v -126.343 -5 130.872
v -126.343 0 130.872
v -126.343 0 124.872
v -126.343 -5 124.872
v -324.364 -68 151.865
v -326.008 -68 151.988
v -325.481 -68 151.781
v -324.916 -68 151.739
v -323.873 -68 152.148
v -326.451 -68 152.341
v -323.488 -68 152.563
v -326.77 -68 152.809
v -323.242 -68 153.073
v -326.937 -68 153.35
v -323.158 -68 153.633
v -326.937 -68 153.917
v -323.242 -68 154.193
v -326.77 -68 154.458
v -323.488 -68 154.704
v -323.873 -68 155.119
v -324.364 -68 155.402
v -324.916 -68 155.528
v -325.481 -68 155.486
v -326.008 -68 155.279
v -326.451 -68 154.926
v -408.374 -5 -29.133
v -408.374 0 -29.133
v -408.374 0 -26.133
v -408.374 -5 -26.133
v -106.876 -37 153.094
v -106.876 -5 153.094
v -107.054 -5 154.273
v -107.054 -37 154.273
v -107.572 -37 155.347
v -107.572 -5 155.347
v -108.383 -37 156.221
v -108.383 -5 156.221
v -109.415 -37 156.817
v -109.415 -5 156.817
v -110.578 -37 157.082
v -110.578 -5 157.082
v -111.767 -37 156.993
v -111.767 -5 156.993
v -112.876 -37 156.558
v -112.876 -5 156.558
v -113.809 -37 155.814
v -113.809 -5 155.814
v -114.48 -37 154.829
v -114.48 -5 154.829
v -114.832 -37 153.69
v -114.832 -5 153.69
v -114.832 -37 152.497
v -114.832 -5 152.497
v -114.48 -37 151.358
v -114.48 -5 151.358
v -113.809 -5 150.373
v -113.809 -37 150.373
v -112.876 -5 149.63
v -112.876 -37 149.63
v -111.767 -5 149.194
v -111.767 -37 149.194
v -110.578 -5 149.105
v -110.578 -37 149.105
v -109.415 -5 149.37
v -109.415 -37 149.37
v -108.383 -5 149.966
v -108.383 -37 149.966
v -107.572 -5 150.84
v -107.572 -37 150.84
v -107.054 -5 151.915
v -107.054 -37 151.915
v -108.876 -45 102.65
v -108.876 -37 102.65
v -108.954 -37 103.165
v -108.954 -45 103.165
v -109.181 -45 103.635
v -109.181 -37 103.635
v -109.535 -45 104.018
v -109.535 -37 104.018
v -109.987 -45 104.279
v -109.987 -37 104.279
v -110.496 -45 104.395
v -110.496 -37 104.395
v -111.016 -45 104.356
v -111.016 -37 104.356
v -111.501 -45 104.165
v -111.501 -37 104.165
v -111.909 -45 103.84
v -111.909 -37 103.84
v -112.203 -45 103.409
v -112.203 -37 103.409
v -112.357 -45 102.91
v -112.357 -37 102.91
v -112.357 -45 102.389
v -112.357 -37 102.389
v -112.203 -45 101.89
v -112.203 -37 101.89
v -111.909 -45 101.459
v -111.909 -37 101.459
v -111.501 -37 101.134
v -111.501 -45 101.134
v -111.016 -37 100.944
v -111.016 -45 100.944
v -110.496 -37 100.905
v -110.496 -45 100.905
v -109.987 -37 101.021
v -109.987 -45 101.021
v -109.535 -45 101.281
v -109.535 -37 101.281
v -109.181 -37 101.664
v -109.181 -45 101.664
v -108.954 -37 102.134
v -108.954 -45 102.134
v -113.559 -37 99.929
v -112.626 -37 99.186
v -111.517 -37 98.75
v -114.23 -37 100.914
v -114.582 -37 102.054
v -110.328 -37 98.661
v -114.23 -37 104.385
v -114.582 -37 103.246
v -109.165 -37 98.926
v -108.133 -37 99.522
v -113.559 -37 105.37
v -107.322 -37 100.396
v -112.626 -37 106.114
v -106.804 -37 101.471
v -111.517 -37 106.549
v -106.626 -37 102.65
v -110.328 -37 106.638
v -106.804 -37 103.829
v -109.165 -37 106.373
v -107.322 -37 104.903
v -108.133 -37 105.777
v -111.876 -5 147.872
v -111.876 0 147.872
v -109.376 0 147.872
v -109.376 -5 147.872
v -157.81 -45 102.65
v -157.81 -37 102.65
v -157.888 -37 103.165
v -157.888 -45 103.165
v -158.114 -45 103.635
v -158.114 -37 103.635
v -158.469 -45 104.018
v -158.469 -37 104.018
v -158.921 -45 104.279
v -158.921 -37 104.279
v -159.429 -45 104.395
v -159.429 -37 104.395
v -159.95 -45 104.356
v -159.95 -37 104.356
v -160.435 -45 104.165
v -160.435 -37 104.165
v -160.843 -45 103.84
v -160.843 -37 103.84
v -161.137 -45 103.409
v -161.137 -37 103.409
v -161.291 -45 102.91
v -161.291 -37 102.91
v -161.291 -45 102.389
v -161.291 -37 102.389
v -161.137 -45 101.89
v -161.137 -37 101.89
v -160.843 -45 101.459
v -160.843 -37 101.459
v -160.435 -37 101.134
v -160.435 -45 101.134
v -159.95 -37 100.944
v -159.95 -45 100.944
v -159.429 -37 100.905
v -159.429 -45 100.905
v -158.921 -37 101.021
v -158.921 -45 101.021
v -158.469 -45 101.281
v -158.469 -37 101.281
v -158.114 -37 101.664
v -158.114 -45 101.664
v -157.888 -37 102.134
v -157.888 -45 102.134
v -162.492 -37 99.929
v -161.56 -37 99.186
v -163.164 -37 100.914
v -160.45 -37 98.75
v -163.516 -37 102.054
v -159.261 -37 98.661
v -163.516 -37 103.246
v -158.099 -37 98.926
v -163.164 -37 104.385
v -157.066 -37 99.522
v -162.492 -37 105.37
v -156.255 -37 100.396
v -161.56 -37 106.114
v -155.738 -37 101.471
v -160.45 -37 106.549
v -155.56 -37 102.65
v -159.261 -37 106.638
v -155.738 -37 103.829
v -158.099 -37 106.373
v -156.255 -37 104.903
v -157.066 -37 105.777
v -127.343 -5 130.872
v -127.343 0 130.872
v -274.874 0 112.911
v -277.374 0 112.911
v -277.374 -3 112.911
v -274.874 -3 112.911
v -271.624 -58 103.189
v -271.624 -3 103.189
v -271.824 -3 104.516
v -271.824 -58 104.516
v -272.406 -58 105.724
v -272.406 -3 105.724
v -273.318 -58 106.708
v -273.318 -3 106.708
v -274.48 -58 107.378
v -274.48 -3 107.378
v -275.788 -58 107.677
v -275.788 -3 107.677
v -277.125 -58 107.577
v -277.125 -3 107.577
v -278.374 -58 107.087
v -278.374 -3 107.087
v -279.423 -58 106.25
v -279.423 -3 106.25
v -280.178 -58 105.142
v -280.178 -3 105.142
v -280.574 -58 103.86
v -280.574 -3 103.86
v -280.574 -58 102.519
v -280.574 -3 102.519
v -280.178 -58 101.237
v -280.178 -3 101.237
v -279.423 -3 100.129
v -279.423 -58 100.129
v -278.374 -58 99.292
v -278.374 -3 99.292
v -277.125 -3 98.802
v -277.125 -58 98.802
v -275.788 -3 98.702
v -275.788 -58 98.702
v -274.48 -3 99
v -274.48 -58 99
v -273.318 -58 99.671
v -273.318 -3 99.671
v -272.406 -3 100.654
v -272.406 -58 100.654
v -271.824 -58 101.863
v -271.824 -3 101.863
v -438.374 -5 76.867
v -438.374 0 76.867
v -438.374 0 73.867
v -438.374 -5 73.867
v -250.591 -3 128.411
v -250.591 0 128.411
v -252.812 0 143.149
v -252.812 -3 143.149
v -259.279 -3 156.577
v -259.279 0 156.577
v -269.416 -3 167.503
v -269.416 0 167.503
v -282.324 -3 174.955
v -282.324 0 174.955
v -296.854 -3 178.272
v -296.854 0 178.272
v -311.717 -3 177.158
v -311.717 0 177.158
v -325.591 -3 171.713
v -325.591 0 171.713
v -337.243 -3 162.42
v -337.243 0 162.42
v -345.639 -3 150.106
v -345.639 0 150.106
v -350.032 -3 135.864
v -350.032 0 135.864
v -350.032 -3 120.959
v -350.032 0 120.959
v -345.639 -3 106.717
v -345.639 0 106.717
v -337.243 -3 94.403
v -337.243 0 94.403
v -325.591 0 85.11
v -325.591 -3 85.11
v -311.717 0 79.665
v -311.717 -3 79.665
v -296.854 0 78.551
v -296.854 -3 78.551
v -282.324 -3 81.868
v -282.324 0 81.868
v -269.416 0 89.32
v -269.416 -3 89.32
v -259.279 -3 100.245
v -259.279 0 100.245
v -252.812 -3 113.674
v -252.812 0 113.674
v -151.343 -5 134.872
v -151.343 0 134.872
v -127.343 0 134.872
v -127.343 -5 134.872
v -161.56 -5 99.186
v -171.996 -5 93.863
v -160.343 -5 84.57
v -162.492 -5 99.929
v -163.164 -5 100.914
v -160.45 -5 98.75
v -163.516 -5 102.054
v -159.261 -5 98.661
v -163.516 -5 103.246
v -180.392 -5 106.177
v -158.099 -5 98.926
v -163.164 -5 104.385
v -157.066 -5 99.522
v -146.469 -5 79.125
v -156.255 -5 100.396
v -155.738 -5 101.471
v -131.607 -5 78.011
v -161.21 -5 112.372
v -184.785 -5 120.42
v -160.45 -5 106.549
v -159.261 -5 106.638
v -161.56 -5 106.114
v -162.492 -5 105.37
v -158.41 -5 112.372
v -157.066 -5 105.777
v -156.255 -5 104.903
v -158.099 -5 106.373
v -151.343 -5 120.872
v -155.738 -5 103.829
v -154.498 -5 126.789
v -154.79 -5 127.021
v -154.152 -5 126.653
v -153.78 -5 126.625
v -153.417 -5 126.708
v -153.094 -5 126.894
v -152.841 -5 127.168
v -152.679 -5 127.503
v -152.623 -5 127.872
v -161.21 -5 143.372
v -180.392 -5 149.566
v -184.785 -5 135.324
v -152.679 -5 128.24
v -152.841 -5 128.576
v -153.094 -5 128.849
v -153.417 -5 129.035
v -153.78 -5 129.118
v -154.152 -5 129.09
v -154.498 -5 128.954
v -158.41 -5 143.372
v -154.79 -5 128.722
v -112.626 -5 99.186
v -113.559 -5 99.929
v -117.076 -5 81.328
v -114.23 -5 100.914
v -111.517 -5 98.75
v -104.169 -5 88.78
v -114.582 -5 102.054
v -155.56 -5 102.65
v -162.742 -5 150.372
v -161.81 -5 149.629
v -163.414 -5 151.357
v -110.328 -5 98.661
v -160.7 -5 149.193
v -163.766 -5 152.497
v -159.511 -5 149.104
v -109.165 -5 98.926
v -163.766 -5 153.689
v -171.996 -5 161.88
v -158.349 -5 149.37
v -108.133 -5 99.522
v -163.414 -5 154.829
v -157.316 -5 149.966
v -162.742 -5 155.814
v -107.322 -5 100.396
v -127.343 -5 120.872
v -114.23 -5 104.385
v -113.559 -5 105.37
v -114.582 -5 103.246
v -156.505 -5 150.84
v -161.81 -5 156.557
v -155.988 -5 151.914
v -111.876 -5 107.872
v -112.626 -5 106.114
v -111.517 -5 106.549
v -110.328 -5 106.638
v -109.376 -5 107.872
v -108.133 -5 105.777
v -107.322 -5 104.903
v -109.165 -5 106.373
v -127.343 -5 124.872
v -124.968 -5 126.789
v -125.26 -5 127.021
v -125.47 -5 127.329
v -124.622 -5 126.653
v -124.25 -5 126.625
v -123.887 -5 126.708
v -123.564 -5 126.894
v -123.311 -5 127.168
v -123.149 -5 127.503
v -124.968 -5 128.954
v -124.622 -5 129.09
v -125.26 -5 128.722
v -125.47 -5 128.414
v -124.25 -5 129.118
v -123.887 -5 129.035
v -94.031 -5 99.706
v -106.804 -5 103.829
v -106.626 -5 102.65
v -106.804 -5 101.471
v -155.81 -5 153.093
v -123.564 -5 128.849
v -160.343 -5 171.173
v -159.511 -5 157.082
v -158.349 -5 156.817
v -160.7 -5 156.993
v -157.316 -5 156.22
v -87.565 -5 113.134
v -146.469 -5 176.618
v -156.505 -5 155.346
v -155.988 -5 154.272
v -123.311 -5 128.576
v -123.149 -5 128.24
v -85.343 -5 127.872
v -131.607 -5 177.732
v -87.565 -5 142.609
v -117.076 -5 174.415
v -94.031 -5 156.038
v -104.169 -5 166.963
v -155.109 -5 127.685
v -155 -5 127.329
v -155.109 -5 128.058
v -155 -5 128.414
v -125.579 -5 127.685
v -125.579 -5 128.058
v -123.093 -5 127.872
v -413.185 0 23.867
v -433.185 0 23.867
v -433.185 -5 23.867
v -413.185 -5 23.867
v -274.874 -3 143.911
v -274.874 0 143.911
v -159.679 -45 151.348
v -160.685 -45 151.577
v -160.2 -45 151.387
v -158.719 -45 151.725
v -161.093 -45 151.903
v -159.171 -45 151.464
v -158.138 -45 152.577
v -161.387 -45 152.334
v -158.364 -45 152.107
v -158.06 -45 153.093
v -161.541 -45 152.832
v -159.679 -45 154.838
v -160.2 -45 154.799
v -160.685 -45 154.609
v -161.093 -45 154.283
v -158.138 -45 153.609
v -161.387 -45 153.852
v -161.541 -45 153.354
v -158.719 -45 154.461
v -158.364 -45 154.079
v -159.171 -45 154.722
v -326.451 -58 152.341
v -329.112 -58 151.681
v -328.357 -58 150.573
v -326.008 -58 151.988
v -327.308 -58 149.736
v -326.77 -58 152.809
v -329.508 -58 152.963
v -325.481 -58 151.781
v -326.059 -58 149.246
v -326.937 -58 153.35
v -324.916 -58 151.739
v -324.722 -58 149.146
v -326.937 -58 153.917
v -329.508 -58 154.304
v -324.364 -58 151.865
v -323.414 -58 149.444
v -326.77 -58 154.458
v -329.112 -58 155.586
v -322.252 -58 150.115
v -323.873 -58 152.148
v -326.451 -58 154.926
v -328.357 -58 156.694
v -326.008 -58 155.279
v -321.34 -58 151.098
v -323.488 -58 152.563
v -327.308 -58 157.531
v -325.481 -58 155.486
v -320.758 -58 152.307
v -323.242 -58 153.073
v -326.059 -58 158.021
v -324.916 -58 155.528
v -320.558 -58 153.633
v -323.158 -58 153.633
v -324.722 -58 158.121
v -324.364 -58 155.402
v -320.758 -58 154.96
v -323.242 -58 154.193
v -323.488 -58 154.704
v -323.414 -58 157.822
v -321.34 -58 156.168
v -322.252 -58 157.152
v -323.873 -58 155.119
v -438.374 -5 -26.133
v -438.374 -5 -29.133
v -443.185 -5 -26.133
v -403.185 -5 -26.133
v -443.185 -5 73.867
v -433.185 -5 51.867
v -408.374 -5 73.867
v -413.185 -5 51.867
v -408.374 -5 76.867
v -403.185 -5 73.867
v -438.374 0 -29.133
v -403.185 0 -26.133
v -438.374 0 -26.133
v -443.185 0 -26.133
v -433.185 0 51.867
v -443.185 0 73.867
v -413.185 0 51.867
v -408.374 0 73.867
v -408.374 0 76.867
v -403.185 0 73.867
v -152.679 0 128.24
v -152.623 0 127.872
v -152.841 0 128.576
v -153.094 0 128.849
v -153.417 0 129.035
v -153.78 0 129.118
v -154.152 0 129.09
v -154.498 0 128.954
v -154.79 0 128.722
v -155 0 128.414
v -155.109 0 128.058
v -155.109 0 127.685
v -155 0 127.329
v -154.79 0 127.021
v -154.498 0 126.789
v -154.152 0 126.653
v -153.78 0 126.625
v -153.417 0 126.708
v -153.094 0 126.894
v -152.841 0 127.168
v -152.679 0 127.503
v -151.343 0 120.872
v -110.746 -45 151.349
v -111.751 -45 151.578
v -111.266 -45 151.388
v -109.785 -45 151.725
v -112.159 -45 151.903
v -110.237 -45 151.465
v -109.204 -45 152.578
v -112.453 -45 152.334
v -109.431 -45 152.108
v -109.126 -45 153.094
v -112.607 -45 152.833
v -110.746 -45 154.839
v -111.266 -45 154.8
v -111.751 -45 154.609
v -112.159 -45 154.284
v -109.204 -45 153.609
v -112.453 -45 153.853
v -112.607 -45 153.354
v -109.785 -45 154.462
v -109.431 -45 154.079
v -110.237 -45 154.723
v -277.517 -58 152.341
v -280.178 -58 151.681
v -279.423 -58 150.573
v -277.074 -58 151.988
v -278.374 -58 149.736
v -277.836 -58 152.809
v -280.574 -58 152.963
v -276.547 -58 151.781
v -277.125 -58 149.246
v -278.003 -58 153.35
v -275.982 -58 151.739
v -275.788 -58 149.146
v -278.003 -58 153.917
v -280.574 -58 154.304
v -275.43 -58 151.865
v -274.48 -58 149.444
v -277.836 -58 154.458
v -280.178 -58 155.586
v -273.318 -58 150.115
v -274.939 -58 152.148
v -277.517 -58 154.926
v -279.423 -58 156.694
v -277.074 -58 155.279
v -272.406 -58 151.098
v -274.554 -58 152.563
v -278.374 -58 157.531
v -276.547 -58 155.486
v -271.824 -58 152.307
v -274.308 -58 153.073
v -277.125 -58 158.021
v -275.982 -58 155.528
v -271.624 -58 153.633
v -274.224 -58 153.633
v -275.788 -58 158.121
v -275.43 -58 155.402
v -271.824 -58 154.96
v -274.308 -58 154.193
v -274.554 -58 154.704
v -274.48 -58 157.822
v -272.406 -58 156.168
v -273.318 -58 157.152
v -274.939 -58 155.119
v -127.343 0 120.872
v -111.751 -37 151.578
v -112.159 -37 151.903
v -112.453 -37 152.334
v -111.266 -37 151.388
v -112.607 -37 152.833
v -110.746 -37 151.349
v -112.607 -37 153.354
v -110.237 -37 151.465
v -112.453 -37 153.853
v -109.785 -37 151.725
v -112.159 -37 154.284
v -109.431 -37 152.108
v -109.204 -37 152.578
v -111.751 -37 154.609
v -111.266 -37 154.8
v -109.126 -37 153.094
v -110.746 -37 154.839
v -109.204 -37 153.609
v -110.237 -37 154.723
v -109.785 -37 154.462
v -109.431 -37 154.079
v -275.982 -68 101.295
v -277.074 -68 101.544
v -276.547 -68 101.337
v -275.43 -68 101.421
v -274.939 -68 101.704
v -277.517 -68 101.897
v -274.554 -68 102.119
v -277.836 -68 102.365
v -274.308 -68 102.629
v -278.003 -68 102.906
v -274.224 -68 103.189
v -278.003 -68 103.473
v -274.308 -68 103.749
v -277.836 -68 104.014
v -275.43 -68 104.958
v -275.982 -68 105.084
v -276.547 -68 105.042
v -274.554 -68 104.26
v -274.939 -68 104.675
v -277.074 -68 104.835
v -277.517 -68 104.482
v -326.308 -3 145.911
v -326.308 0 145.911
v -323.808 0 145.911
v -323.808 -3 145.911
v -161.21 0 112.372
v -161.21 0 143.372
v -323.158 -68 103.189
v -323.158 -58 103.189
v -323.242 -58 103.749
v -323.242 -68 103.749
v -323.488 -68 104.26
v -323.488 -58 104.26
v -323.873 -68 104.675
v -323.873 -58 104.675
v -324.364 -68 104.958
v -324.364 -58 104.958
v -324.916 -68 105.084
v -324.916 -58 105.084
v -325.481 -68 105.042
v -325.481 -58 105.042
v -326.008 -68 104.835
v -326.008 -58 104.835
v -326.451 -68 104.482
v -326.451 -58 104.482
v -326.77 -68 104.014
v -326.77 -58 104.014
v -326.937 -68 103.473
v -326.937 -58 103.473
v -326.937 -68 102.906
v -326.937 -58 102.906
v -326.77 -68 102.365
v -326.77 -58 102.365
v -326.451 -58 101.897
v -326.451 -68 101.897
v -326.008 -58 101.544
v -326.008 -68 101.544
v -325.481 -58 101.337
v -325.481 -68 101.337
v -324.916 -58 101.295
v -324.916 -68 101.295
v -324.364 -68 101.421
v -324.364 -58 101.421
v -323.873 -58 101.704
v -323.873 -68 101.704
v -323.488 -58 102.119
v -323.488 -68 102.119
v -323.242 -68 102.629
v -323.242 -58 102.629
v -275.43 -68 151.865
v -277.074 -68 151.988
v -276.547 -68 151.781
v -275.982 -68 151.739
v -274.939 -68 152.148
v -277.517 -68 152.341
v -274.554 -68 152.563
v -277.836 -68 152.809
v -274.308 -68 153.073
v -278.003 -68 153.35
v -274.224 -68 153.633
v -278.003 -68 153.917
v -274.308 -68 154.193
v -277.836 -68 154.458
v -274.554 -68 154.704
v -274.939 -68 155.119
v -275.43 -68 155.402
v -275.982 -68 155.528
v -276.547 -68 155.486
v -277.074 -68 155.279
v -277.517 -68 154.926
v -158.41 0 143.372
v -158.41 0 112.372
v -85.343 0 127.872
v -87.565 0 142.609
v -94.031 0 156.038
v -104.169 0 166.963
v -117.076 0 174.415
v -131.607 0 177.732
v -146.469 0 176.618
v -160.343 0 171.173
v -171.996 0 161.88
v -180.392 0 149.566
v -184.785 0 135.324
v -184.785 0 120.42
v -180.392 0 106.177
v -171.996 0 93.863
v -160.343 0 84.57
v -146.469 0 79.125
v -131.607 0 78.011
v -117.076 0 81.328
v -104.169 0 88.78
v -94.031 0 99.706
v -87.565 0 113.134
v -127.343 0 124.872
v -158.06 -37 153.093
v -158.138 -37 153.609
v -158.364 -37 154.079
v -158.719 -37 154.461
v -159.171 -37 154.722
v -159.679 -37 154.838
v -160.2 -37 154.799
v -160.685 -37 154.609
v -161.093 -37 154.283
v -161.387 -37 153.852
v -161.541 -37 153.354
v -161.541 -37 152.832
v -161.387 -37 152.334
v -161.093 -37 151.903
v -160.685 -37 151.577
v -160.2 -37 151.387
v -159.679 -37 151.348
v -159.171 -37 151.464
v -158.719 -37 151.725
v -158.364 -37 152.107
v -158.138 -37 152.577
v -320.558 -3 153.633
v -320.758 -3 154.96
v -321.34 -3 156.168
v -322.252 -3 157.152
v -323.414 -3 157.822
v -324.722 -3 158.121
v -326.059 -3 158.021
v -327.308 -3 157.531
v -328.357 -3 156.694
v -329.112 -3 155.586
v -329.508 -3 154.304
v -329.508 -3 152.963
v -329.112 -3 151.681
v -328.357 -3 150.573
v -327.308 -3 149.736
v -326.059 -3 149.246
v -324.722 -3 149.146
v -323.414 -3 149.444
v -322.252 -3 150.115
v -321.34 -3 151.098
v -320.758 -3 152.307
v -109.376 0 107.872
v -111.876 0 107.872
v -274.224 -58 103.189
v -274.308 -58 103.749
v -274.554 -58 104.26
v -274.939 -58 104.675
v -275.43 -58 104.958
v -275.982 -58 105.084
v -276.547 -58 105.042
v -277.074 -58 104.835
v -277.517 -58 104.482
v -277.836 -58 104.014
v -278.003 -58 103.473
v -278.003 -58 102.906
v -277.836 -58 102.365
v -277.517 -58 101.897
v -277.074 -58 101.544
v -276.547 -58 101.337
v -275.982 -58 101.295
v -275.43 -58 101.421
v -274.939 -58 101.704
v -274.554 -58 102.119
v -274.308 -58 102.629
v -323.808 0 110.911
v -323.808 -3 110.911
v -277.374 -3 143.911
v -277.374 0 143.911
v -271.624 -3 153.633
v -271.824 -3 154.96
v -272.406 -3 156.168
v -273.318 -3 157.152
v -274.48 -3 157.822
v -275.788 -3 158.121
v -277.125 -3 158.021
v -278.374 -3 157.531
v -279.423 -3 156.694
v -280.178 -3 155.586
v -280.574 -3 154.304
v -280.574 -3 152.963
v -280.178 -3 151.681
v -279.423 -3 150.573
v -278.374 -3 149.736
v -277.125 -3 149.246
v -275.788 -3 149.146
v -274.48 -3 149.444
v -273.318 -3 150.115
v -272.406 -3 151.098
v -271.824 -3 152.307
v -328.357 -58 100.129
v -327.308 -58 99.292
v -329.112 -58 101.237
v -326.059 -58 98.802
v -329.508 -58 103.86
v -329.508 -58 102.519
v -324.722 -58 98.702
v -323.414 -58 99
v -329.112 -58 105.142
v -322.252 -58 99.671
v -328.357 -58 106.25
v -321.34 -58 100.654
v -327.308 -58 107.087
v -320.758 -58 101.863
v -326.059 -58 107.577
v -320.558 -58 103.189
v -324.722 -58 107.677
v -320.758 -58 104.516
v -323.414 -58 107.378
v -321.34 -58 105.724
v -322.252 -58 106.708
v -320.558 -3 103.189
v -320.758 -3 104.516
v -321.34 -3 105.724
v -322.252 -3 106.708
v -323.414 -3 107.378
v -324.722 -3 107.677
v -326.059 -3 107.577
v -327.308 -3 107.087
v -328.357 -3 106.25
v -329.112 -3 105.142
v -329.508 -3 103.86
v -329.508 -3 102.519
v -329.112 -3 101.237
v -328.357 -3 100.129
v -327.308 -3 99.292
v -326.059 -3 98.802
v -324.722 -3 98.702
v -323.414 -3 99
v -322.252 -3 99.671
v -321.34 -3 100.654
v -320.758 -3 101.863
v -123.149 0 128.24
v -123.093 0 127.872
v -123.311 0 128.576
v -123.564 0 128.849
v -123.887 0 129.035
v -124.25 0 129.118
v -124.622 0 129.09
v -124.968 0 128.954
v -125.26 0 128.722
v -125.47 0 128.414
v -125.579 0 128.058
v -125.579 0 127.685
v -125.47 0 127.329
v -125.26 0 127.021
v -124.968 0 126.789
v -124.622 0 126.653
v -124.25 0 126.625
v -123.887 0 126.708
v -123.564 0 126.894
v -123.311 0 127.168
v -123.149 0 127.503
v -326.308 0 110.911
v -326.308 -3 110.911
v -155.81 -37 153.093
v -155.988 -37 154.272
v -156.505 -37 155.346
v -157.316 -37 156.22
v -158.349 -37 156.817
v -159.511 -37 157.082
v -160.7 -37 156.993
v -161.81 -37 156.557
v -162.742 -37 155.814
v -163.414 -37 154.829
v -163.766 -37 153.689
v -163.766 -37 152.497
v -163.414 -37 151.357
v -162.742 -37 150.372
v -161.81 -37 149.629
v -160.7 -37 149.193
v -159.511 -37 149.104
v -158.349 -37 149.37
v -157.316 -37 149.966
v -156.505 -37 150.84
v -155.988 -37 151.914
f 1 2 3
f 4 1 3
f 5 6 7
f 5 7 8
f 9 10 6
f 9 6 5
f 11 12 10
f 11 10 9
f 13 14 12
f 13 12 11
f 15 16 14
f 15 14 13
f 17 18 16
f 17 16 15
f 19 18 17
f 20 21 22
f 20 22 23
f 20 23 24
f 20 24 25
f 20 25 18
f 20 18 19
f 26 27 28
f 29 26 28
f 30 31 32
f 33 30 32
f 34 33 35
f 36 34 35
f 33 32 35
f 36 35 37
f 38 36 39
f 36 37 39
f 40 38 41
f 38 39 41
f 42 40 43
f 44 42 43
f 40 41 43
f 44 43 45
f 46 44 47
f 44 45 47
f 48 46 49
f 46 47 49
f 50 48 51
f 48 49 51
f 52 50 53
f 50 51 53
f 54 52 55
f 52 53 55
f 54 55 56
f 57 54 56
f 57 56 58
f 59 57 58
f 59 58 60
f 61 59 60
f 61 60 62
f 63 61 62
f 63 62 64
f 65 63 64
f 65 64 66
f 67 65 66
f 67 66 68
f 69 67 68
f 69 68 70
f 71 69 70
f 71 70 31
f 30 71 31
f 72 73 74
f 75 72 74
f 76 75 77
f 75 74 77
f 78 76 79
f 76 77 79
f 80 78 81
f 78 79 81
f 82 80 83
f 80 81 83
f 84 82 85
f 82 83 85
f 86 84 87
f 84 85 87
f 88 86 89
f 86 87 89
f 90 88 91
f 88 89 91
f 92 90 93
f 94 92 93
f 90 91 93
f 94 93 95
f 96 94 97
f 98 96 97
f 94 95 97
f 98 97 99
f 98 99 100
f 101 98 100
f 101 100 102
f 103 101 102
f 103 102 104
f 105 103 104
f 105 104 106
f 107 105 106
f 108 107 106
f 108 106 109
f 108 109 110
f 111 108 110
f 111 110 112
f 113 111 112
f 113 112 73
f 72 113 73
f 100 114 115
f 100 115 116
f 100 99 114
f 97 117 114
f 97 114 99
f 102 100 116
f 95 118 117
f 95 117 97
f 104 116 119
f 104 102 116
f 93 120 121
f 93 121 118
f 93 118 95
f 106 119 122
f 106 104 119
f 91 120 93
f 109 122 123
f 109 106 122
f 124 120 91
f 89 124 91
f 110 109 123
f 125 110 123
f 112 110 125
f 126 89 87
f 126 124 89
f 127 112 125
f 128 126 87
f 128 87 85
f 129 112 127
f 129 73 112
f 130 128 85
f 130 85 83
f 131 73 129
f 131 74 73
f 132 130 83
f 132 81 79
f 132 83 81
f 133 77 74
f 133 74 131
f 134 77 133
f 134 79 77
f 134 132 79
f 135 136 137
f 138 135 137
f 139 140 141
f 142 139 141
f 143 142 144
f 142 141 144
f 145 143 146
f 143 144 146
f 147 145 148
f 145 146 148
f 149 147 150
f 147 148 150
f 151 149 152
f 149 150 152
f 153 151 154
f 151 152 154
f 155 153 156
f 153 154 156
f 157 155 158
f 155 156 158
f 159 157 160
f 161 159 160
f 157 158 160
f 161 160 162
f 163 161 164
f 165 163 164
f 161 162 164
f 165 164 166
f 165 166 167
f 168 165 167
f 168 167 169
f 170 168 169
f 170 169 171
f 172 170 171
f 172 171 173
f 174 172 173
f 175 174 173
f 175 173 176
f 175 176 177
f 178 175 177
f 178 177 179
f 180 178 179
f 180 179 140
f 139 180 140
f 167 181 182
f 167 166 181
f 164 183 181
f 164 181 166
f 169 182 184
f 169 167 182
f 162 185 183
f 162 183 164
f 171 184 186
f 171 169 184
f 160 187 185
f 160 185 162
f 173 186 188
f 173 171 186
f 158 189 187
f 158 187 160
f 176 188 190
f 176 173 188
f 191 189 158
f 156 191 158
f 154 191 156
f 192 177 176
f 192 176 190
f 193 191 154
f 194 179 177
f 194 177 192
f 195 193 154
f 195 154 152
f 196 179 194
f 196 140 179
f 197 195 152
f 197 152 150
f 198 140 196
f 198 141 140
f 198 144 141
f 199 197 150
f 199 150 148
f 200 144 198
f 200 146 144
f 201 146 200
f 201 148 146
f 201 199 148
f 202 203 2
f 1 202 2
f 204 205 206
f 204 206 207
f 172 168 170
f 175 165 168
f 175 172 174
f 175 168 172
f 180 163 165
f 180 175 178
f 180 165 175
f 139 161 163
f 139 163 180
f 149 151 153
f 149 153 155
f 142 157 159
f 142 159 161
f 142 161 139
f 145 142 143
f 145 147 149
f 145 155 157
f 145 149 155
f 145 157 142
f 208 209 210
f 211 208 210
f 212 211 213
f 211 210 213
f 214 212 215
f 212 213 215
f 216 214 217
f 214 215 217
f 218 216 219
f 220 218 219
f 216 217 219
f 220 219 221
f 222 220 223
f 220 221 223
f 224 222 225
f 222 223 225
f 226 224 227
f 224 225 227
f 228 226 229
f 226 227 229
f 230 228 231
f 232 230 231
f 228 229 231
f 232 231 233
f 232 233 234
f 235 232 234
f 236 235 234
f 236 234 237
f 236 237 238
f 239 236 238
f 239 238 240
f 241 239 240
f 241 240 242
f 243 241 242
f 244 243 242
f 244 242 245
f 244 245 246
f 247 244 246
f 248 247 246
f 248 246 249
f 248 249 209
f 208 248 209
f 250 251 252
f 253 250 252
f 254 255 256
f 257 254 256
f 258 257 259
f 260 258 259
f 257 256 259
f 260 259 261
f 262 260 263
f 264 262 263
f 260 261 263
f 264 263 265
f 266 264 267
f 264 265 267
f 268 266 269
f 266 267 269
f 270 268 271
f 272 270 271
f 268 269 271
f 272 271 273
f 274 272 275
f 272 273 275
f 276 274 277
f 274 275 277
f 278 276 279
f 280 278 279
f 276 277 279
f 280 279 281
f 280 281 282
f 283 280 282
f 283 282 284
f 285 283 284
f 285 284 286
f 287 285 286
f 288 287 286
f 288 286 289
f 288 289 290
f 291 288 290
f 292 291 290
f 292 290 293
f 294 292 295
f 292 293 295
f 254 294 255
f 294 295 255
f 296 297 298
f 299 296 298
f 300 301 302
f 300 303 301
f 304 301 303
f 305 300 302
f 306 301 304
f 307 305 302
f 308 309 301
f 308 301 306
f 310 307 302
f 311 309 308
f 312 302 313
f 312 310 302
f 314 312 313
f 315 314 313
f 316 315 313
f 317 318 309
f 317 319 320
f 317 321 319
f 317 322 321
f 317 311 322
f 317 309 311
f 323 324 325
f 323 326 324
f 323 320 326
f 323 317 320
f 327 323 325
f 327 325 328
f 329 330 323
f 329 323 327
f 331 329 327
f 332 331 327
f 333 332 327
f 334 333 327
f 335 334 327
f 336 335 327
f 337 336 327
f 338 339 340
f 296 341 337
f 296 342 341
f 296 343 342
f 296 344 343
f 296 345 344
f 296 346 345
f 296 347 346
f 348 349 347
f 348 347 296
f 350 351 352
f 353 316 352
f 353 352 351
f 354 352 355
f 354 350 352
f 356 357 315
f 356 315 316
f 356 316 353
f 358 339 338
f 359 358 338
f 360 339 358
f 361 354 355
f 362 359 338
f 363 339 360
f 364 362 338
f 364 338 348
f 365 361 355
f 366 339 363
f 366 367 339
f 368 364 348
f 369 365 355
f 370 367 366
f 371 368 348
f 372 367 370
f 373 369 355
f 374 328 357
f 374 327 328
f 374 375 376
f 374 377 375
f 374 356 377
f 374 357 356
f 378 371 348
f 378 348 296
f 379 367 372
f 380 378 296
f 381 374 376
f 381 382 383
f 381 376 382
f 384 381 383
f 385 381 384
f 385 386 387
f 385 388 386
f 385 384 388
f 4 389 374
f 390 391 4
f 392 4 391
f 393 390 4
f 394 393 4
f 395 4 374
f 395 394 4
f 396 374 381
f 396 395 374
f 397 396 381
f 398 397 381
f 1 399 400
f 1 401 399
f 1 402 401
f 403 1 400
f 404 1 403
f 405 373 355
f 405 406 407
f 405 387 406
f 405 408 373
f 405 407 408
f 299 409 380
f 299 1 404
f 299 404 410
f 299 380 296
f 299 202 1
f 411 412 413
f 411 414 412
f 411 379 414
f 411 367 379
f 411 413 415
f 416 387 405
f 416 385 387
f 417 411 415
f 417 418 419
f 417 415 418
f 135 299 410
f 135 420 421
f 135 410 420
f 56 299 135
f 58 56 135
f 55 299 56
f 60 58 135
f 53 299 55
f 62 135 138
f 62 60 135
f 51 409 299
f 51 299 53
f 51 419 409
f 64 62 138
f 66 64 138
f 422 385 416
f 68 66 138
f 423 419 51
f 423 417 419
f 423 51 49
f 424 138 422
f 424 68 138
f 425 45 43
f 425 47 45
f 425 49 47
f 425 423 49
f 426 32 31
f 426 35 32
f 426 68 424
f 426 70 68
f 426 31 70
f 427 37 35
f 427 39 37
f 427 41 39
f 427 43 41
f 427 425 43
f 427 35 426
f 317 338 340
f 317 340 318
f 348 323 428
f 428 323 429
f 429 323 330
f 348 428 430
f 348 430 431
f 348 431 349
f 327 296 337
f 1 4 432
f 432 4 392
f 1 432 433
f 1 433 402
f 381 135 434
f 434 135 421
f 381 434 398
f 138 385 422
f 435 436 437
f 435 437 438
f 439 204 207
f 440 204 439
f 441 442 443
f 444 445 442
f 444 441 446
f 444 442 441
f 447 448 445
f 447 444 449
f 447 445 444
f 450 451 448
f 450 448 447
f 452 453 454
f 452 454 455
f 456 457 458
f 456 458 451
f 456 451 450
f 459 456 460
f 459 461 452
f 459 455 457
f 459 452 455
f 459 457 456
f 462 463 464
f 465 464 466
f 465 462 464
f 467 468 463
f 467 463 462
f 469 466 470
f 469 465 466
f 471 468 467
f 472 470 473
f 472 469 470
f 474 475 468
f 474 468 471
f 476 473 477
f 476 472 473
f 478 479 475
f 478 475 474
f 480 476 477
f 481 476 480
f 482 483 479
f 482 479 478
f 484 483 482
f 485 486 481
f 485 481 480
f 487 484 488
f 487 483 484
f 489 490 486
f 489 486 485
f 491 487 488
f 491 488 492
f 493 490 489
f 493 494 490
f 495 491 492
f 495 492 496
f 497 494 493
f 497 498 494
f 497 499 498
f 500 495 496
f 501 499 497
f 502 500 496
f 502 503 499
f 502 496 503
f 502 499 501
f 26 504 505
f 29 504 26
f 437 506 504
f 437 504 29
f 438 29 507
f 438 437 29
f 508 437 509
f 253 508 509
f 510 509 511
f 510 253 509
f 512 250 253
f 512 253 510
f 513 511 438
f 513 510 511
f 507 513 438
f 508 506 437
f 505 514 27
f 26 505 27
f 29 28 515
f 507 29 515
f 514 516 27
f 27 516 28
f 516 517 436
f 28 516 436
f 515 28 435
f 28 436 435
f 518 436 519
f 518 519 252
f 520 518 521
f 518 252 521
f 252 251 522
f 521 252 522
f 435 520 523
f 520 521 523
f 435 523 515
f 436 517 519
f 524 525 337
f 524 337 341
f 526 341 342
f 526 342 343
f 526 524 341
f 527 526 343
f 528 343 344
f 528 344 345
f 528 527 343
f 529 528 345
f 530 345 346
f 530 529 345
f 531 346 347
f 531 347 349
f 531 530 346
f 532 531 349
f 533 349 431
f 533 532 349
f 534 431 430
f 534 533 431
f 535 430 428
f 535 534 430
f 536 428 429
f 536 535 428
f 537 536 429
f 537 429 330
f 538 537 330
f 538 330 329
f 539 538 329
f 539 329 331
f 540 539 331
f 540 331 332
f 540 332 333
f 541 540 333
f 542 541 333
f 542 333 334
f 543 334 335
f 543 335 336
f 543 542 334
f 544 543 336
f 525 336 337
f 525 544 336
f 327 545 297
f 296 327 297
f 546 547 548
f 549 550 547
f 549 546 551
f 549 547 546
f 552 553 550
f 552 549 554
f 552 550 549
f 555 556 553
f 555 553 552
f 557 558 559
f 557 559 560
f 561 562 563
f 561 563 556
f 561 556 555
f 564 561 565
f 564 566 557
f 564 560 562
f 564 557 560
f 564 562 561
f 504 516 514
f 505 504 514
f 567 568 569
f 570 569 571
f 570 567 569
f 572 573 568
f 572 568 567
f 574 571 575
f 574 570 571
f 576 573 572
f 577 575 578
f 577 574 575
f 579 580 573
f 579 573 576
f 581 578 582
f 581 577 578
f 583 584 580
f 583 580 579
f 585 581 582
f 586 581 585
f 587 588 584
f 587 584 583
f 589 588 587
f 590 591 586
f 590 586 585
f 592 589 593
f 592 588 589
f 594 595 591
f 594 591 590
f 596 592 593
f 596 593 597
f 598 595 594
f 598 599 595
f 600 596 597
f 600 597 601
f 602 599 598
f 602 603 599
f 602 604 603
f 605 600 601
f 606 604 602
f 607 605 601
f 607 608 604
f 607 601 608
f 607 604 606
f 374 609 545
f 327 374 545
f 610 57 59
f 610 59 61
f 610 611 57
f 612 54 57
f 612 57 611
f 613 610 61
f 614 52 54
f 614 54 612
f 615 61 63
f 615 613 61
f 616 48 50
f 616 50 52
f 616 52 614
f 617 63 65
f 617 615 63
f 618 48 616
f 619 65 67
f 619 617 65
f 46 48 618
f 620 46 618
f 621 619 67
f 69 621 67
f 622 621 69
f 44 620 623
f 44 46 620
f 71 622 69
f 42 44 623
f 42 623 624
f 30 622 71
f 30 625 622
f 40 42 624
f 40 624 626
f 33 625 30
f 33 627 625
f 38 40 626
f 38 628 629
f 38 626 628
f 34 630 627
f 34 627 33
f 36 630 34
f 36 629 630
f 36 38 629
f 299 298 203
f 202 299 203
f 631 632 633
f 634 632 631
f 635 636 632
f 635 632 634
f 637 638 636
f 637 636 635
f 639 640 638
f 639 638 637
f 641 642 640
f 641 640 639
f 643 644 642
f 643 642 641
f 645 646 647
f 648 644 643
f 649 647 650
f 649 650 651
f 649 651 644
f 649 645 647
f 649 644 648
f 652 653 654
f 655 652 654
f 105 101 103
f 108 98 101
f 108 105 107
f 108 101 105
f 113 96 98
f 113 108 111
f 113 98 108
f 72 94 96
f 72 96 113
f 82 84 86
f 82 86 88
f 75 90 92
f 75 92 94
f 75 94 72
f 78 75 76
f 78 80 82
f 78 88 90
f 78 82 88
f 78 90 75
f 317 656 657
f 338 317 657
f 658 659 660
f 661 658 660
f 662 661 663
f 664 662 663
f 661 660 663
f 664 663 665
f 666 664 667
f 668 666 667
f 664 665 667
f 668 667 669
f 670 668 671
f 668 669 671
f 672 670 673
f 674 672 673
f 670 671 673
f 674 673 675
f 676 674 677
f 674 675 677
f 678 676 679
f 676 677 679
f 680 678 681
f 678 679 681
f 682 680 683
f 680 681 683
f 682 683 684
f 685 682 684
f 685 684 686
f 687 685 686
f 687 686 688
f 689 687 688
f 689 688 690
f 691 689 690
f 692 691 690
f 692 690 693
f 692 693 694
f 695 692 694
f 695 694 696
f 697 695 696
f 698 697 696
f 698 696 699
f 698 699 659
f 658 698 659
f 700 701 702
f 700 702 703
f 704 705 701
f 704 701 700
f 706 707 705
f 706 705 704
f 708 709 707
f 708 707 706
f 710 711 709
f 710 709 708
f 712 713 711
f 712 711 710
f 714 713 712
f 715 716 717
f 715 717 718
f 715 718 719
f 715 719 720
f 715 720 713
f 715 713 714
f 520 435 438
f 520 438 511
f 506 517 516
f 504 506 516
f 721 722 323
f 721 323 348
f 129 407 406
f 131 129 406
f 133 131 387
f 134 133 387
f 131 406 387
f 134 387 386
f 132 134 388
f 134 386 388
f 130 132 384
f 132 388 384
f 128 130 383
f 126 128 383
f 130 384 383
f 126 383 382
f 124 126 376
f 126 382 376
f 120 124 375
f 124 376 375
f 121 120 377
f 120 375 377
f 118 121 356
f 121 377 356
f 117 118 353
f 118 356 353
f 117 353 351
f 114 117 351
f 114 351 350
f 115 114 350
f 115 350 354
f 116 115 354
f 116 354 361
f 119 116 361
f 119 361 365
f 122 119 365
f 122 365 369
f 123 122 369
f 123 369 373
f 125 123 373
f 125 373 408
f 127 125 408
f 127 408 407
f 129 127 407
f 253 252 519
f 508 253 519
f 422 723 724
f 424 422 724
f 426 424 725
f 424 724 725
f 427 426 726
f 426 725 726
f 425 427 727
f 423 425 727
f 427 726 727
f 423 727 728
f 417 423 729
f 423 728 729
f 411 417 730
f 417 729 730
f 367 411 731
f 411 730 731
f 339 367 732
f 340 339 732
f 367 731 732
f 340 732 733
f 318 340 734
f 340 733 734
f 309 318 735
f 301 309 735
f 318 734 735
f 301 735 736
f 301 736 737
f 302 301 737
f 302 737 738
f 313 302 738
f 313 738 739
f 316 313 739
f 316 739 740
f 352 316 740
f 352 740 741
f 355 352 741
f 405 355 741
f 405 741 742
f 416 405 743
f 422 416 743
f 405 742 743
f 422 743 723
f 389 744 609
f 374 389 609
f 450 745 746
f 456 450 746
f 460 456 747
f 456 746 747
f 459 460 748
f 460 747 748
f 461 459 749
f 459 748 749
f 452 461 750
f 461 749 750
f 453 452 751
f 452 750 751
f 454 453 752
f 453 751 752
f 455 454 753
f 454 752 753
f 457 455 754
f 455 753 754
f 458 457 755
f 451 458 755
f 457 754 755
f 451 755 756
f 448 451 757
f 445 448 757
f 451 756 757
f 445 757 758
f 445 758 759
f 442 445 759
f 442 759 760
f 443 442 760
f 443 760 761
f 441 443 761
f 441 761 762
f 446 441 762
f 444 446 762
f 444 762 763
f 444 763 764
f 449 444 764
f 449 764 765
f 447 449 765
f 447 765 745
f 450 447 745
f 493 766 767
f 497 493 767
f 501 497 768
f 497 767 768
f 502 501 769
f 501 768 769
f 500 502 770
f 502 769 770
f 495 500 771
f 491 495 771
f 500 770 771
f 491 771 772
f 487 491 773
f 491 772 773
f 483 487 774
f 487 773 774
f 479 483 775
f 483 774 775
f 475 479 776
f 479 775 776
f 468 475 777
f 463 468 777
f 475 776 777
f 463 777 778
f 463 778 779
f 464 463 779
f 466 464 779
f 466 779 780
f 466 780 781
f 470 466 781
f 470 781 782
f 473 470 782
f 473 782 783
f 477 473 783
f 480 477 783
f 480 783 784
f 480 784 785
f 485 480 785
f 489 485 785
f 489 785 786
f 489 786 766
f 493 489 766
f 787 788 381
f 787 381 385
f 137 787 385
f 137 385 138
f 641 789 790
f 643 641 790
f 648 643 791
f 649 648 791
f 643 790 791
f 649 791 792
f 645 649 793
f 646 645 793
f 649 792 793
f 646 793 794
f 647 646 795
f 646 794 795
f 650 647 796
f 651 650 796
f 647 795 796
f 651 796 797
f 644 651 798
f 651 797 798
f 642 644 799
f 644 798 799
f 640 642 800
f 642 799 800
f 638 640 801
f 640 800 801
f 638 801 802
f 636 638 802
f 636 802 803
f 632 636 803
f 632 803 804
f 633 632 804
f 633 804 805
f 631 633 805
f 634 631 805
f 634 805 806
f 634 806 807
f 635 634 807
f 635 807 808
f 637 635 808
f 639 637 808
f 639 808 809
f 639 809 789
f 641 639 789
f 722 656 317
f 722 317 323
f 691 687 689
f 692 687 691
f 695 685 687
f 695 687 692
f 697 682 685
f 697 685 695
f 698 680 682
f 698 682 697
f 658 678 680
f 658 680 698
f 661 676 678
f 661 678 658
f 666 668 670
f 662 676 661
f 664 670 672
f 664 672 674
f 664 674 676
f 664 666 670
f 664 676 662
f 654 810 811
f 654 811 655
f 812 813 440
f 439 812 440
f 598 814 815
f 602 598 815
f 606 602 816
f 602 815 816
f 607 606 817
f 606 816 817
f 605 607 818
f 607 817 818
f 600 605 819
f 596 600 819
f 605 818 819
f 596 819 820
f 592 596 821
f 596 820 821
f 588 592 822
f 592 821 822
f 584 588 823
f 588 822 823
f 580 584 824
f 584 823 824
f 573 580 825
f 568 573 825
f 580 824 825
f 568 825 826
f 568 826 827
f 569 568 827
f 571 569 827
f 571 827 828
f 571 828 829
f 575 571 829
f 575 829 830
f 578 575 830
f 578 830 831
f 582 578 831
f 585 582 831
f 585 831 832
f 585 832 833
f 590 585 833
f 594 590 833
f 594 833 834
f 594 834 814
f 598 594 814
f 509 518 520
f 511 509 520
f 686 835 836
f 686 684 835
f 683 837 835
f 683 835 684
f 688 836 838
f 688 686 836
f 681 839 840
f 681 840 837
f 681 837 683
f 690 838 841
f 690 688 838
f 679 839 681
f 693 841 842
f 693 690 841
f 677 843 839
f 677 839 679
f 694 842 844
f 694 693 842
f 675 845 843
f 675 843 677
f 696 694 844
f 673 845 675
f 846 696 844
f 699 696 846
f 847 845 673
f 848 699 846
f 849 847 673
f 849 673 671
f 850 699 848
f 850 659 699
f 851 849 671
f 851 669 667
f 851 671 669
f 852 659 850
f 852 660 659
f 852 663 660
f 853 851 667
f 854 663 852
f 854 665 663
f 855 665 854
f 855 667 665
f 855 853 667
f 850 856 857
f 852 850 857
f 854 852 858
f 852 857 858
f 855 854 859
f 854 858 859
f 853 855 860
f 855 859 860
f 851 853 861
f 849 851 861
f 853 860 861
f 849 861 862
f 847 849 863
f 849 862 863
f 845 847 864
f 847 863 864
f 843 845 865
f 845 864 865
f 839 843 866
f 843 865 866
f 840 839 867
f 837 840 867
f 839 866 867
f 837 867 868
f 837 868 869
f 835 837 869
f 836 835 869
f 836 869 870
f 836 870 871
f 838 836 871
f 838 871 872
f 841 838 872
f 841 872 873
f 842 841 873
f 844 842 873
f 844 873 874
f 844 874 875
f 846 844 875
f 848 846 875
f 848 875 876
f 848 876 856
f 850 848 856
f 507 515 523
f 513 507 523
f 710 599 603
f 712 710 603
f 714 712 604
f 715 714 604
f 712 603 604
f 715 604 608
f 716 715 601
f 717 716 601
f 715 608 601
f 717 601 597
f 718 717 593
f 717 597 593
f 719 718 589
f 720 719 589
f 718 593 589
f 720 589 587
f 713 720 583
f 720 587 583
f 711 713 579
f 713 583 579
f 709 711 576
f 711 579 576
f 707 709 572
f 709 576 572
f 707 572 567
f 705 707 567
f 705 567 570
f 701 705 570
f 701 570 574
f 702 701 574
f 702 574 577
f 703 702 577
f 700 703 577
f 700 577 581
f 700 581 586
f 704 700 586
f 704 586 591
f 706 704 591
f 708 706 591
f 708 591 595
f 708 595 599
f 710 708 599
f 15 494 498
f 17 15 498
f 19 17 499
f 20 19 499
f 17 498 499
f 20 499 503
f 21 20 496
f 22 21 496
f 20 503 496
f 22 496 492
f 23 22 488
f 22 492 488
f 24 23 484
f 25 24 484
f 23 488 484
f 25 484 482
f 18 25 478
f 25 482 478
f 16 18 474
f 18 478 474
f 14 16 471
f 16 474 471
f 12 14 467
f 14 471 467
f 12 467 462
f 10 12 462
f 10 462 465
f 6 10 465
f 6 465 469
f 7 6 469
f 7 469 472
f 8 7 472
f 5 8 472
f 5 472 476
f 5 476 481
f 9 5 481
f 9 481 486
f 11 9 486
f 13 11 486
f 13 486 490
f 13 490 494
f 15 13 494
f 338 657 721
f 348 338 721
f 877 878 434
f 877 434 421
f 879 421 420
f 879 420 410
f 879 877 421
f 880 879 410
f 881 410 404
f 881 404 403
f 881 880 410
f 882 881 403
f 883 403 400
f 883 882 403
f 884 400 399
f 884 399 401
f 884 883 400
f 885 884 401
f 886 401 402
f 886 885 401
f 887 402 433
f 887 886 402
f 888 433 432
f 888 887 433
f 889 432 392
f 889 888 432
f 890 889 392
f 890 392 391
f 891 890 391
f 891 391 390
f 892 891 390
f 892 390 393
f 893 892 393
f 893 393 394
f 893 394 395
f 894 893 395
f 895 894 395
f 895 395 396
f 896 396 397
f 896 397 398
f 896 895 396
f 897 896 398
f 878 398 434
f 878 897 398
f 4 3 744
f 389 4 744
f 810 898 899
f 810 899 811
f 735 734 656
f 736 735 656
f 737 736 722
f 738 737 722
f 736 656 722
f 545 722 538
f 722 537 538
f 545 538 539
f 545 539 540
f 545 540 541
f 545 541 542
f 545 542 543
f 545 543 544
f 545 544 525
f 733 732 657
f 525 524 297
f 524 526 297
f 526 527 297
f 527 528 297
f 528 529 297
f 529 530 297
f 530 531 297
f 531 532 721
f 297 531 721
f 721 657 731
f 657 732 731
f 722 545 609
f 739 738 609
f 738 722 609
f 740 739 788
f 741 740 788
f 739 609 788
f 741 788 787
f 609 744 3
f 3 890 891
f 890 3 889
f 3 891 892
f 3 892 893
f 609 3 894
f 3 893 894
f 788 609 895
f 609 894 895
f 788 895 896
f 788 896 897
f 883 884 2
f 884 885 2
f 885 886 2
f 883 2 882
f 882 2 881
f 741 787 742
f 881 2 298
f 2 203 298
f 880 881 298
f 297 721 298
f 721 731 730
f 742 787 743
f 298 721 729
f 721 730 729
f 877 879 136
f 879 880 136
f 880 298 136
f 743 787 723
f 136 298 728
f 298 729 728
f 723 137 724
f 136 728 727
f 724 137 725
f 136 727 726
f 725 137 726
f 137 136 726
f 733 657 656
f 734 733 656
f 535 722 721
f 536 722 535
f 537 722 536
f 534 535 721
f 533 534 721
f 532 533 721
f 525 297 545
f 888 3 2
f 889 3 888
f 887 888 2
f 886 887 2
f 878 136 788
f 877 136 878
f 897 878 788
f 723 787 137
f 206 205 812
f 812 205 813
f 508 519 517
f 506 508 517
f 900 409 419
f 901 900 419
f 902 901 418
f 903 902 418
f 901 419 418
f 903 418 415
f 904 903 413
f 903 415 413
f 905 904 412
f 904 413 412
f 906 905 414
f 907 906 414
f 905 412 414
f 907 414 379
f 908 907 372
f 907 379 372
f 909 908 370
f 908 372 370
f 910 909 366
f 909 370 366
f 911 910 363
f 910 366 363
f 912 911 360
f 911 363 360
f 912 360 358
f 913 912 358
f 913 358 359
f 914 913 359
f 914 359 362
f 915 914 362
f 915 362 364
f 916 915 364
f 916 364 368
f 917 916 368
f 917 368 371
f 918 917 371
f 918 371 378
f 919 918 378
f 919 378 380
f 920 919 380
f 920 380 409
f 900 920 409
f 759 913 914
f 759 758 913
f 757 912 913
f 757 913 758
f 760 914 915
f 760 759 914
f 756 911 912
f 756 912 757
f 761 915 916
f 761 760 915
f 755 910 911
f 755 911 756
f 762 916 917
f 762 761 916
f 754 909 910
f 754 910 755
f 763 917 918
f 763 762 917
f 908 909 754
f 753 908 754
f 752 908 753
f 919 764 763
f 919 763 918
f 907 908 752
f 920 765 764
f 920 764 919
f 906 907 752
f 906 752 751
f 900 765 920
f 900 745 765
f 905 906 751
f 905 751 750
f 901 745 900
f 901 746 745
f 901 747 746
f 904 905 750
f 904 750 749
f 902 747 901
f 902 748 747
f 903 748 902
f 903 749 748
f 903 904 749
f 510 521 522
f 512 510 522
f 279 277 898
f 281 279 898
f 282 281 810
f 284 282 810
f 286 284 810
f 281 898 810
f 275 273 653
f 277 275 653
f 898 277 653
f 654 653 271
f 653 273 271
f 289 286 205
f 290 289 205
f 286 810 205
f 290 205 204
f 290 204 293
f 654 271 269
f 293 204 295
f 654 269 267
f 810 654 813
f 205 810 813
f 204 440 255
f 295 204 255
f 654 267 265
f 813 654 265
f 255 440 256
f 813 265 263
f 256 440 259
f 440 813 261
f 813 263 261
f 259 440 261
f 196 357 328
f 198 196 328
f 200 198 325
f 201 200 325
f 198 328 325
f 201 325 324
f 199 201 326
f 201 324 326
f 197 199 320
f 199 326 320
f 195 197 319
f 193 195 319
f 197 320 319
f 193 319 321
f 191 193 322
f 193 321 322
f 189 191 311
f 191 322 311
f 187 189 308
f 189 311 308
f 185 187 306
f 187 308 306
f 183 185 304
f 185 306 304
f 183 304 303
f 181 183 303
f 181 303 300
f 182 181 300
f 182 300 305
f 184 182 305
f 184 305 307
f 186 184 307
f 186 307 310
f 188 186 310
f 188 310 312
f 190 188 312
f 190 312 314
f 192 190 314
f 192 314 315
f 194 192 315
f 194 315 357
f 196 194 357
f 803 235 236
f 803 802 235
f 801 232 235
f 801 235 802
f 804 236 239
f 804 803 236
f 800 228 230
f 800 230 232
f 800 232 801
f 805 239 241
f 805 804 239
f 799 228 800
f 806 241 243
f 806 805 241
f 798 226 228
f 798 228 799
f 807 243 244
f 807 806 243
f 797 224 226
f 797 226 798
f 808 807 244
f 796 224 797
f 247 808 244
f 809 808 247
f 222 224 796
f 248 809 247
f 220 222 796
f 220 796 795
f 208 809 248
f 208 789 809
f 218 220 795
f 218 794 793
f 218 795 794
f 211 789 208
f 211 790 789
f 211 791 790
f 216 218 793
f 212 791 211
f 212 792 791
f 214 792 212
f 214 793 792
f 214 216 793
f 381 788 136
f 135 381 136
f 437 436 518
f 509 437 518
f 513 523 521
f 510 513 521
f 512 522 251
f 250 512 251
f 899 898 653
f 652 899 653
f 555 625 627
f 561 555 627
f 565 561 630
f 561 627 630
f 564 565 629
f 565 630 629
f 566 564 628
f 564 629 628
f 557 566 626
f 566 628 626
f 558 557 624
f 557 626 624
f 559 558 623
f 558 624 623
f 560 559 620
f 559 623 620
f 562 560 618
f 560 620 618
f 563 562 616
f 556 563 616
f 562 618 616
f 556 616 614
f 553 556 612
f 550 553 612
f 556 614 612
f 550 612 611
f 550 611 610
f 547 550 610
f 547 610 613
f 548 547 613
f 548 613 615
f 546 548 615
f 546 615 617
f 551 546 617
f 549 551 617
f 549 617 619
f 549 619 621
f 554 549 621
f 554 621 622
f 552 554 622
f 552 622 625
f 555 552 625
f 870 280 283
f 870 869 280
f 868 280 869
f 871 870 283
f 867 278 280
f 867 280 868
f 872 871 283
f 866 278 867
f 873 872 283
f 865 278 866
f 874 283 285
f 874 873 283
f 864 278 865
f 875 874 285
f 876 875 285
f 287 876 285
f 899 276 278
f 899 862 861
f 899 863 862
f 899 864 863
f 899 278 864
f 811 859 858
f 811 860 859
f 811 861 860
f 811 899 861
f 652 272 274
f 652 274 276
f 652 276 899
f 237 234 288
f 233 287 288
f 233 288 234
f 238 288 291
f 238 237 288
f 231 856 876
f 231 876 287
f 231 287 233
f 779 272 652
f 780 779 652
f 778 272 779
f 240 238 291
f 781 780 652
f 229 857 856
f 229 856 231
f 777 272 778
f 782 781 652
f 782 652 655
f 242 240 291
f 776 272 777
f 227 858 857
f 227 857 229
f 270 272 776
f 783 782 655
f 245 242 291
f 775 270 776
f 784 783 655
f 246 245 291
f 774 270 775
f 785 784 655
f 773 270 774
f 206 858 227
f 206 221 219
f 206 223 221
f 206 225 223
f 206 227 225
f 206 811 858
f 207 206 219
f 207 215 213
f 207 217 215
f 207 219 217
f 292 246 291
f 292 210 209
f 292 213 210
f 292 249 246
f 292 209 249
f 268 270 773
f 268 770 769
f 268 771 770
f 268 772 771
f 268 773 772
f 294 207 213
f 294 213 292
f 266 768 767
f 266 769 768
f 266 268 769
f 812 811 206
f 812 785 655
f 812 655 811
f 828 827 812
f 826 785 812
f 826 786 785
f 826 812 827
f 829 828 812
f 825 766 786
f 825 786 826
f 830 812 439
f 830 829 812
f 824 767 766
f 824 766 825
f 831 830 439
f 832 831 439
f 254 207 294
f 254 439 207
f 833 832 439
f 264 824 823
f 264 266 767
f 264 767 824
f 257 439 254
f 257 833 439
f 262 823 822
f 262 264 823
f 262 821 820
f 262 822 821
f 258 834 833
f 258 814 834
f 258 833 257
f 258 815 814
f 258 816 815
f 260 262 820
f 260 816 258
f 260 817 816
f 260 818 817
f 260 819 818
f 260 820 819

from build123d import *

# Parameters (mm, degrees)
F0_R     = 50
F0_R_2   = 4
F0_W     = 2.8
F0_H     = 31
F0_R_3   = 1.25
F0_W_2   = 2.5
F0_H_2   = 40
F1_DEPTH = 5
F0_R_4   = 1.75
F2_DEPTH = 37
F3_DEPTH = 45
F0_W_3   = 20
F0_H_3   = 28
F4_DEPTH = 5
F0_R_5   = 4.5
F0_H_4   = 35
F5_DEPTH = 3
F0_R_6   = 1.9
F6_DEPTH = 58
F7_DEPTH = 68


with BuildPart() as f1:
    # F0 (on Front) → F1 (new body)
    with BuildSketch(Plane.XZ):
        with Locations((-135.343364, 127.871662)):
            Circle(F0_R)
        with Locations((-159.560265, 102.649672)):
            Circle(F0_R_2, mode=Mode.SUBTRACT)
        with Locations((-110.626463, 102.649672)):
            Circle(F0_R_2, mode=Mode.SUBTRACT)
        with Locations((-159.810265, 127.871662)):
            Rectangle(F0_W, F0_H, mode=Mode.SUBTRACT)
        with Locations((-153.873364, 127.871662)):
            Circle(F0_R_3, mode=Mode.SUBTRACT)
        Polygon((-151.343364, 134.871662), (-127.343364, 134.871662), (-127.343364, 130.871662), (-126.343364, 130.871662), (-126.343364, 124.871662), (-127.343364, 124.871662), (-127.343364, 120.871662), (-151.343364, 120.871662), align=None, mode=Mode.SUBTRACT)
        with Locations((-124.343364, 127.871662)):
            Circle(F0_R_3, mode=Mode.SUBTRACT)
        with Locations((-110.626463, 127.871662)):
            Rectangle(F0_W_2, F0_H_2, mode=Mode.SUBTRACT)
        with Locations((-159.810265, 153.093033)):
            Circle(F0_R_2, mode=Mode.SUBTRACT)
        with Locations((-110.876463, 153.093652)):
            Circle(F0_R_2, mode=Mode.SUBTRACT)
    extrude(amount=F1_DEPTH)

    # F0 (on Front) → F2 (join)
    with BuildSketch(Plane.XZ):
        with Locations((-159.560265, 102.649672)):
            Circle(F0_R_2)
        with Locations((-159.560265, 102.649672)):
            Circle(F0_R_4, mode=Mode.SUBTRACT)
        with Locations((-110.626463, 102.649672)):
            Circle(F0_R_2)
        with Locations((-110.626463, 102.649672)):
            Circle(F0_R_4, mode=Mode.SUBTRACT)
        with Locations((-110.876463, 153.093652)):
            Circle(F0_R_2)
        with Locations((-110.876463, 153.093652)):
            Circle(F0_R_4, mode=Mode.SUBTRACT)
        with Locations((-159.810265, 153.093033)):
            Circle(F0_R_2)
        with Locations((-159.810265, 153.093033)):
            Circle(F0_R_4, mode=Mode.SUBTRACT)
    extrude(amount=F2_DEPTH)

    # F0 (on Front) → F3 (join)
    with BuildSketch(Plane.XZ):
        with Locations((-159.810265, 153.093033)):
            Circle(F0_R_4)
        with Locations((-110.876463, 153.093652)):
            Circle(F0_R_4)
        with Locations((-110.626463, 102.649672)):
            Circle(F0_R_4)
        with Locations((-159.560265, 102.649672)):
            Circle(F0_R_4)
    extrude(amount=F3_DEPTH)


with BuildPart() as f4:
    # F0 (on Front) → F4 (new body)
    with BuildSketch(Plane.XZ):
        Polygon((-408.373774, -26.132504), (-403.185389, -26.132504), (-403.185389, 73.867496), (-408.373774, 73.867496), (-408.373774, 76.867496), (-438.373774, 76.867496), (-438.373774, 73.867496), (-443.185389, 73.867496), (-443.185389, -26.132504), (-438.373774, -26.132504), (-438.373774, -29.132504), (-408.373774, -29.132504), align=None)
        with Locations((-423.185389, 37.867496)):
            Rectangle(F0_W_3, F0_H_3, mode=Mode.SUBTRACT)
    extrude(amount=F4_DEPTH)


with BuildPart() as f5:
    # F0 (on Front) → F5 (new body)
    with BuildSketch(Plane.XZ):
        with Locations((-300.590894, 128.411412)):
            Circle(F0_R)
        with BuildLine():
            Line((-330.057795, 161.633402), (-271.123993, 161.633402))
            ThreePointArc((-271.123993, 161.633402), (-267.588459, 160.168936), (-266.123993, 156.633402))
            Line((-266.123993, 156.633402), (-266.123993, 100.189422))
            ThreePointArc((-266.123993, 100.189422), (-267.588459, 96.653888), (-271.123993, 95.189422))
            Line((-271.123993, 95.189422), (-330.057795, 95.189422))
            ThreePointArc((-330.057795, 95.189422), (-333.593329, 96.653888), (-335.057795, 100.189422))
            Line((-335.057795, 100.189422), (-335.057795, 156.633402))
            ThreePointArc((-335.057795, 156.633402), (-333.593329, 160.168936), (-330.057795, 161.633402))
        make_face(mode=Mode.SUBTRACT)
        with BuildLine():
            ThreePointArc((-266.123993, 156.633402), (-267.588459, 160.168936), (-271.123993, 161.633402))
            Line((-271.123993, 161.633402), (-330.057795, 161.633402))
            ThreePointArc((-330.057795, 161.633402), (-333.593329, 160.168936), (-335.057795, 156.633402))
            Line((-335.057795, 156.633402), (-335.057795, 100.189422))
            ThreePointArc((-335.057795, 100.189422), (-333.593329, 96.653888), (-330.057795, 95.189422))
            Line((-330.057795, 95.189422), (-271.123993, 95.189422))
            ThreePointArc((-271.123993, 95.189422), (-267.588459, 96.653888), (-266.123993, 100.189422))
            Line((-266.123993, 100.189422), (-266.123993, 156.633402))
        make_face()
        with Locations((-325.057795, 103.189422)):
            Circle(F0_R_5, mode=Mode.SUBTRACT)
        with Locations((-276.123993, 103.189422)):
            Circle(F0_R_5, mode=Mode.SUBTRACT)
        with Locations((-325.057795, 128.411412)):
            Rectangle(F0_W_2, F0_H_4, mode=Mode.SUBTRACT)
        with Locations((-276.123993, 128.411412)):
            Rectangle(F0_W_2, F0_H, mode=Mode.SUBTRACT)
        with Locations((-325.057795, 153.633402)):
            Circle(F0_R_5, mode=Mode.SUBTRACT)
        with Locations((-276.123993, 153.633402)):
            Circle(F0_R_5, mode=Mode.SUBTRACT)
    extrude(amount=F5_DEPTH)

    # F0 (on Front) → F6 (join)
    with BuildSketch(Plane.XZ):
        with Locations((-325.057795, 153.633402)):
            Circle(F0_R_5)
        with Locations((-325.057795, 153.633402)):
            Circle(F0_R_6, mode=Mode.SUBTRACT)
        with Locations((-276.123993, 153.633402)):
            Circle(F0_R_5)
        with Locations((-276.123993, 153.633402)):
            Circle(F0_R_6, mode=Mode.SUBTRACT)
        with Locations((-276.123993, 103.189422)):
            Circle(F0_R_5)
        with Locations((-276.123993, 103.189422)):
            Circle(F0_R_6, mode=Mode.SUBTRACT)
        with Locations((-325.057795, 103.189422)):
            Circle(F0_R_5)
        with Locations((-325.057795, 103.189422)):
            Circle(F0_R_6, mode=Mode.SUBTRACT)
    extrude(amount=F6_DEPTH)

    # F0 (on Front) → F7 (join)
    with BuildSketch(Plane.XZ):
        with Locations((-325.057795, 153.633402)):
            Circle(F0_R_6)
        with Locations((-276.123993, 153.633402)):
            Circle(F0_R_6)
        with Locations((-276.123993, 103.189422)):
            Circle(F0_R_6)
        with Locations((-325.057795, 103.189422)):
            Circle(F0_R_6)
    extrude(amount=F7_DEPTH)


solid = Compound([f1.part, f4.part, f5.part])
